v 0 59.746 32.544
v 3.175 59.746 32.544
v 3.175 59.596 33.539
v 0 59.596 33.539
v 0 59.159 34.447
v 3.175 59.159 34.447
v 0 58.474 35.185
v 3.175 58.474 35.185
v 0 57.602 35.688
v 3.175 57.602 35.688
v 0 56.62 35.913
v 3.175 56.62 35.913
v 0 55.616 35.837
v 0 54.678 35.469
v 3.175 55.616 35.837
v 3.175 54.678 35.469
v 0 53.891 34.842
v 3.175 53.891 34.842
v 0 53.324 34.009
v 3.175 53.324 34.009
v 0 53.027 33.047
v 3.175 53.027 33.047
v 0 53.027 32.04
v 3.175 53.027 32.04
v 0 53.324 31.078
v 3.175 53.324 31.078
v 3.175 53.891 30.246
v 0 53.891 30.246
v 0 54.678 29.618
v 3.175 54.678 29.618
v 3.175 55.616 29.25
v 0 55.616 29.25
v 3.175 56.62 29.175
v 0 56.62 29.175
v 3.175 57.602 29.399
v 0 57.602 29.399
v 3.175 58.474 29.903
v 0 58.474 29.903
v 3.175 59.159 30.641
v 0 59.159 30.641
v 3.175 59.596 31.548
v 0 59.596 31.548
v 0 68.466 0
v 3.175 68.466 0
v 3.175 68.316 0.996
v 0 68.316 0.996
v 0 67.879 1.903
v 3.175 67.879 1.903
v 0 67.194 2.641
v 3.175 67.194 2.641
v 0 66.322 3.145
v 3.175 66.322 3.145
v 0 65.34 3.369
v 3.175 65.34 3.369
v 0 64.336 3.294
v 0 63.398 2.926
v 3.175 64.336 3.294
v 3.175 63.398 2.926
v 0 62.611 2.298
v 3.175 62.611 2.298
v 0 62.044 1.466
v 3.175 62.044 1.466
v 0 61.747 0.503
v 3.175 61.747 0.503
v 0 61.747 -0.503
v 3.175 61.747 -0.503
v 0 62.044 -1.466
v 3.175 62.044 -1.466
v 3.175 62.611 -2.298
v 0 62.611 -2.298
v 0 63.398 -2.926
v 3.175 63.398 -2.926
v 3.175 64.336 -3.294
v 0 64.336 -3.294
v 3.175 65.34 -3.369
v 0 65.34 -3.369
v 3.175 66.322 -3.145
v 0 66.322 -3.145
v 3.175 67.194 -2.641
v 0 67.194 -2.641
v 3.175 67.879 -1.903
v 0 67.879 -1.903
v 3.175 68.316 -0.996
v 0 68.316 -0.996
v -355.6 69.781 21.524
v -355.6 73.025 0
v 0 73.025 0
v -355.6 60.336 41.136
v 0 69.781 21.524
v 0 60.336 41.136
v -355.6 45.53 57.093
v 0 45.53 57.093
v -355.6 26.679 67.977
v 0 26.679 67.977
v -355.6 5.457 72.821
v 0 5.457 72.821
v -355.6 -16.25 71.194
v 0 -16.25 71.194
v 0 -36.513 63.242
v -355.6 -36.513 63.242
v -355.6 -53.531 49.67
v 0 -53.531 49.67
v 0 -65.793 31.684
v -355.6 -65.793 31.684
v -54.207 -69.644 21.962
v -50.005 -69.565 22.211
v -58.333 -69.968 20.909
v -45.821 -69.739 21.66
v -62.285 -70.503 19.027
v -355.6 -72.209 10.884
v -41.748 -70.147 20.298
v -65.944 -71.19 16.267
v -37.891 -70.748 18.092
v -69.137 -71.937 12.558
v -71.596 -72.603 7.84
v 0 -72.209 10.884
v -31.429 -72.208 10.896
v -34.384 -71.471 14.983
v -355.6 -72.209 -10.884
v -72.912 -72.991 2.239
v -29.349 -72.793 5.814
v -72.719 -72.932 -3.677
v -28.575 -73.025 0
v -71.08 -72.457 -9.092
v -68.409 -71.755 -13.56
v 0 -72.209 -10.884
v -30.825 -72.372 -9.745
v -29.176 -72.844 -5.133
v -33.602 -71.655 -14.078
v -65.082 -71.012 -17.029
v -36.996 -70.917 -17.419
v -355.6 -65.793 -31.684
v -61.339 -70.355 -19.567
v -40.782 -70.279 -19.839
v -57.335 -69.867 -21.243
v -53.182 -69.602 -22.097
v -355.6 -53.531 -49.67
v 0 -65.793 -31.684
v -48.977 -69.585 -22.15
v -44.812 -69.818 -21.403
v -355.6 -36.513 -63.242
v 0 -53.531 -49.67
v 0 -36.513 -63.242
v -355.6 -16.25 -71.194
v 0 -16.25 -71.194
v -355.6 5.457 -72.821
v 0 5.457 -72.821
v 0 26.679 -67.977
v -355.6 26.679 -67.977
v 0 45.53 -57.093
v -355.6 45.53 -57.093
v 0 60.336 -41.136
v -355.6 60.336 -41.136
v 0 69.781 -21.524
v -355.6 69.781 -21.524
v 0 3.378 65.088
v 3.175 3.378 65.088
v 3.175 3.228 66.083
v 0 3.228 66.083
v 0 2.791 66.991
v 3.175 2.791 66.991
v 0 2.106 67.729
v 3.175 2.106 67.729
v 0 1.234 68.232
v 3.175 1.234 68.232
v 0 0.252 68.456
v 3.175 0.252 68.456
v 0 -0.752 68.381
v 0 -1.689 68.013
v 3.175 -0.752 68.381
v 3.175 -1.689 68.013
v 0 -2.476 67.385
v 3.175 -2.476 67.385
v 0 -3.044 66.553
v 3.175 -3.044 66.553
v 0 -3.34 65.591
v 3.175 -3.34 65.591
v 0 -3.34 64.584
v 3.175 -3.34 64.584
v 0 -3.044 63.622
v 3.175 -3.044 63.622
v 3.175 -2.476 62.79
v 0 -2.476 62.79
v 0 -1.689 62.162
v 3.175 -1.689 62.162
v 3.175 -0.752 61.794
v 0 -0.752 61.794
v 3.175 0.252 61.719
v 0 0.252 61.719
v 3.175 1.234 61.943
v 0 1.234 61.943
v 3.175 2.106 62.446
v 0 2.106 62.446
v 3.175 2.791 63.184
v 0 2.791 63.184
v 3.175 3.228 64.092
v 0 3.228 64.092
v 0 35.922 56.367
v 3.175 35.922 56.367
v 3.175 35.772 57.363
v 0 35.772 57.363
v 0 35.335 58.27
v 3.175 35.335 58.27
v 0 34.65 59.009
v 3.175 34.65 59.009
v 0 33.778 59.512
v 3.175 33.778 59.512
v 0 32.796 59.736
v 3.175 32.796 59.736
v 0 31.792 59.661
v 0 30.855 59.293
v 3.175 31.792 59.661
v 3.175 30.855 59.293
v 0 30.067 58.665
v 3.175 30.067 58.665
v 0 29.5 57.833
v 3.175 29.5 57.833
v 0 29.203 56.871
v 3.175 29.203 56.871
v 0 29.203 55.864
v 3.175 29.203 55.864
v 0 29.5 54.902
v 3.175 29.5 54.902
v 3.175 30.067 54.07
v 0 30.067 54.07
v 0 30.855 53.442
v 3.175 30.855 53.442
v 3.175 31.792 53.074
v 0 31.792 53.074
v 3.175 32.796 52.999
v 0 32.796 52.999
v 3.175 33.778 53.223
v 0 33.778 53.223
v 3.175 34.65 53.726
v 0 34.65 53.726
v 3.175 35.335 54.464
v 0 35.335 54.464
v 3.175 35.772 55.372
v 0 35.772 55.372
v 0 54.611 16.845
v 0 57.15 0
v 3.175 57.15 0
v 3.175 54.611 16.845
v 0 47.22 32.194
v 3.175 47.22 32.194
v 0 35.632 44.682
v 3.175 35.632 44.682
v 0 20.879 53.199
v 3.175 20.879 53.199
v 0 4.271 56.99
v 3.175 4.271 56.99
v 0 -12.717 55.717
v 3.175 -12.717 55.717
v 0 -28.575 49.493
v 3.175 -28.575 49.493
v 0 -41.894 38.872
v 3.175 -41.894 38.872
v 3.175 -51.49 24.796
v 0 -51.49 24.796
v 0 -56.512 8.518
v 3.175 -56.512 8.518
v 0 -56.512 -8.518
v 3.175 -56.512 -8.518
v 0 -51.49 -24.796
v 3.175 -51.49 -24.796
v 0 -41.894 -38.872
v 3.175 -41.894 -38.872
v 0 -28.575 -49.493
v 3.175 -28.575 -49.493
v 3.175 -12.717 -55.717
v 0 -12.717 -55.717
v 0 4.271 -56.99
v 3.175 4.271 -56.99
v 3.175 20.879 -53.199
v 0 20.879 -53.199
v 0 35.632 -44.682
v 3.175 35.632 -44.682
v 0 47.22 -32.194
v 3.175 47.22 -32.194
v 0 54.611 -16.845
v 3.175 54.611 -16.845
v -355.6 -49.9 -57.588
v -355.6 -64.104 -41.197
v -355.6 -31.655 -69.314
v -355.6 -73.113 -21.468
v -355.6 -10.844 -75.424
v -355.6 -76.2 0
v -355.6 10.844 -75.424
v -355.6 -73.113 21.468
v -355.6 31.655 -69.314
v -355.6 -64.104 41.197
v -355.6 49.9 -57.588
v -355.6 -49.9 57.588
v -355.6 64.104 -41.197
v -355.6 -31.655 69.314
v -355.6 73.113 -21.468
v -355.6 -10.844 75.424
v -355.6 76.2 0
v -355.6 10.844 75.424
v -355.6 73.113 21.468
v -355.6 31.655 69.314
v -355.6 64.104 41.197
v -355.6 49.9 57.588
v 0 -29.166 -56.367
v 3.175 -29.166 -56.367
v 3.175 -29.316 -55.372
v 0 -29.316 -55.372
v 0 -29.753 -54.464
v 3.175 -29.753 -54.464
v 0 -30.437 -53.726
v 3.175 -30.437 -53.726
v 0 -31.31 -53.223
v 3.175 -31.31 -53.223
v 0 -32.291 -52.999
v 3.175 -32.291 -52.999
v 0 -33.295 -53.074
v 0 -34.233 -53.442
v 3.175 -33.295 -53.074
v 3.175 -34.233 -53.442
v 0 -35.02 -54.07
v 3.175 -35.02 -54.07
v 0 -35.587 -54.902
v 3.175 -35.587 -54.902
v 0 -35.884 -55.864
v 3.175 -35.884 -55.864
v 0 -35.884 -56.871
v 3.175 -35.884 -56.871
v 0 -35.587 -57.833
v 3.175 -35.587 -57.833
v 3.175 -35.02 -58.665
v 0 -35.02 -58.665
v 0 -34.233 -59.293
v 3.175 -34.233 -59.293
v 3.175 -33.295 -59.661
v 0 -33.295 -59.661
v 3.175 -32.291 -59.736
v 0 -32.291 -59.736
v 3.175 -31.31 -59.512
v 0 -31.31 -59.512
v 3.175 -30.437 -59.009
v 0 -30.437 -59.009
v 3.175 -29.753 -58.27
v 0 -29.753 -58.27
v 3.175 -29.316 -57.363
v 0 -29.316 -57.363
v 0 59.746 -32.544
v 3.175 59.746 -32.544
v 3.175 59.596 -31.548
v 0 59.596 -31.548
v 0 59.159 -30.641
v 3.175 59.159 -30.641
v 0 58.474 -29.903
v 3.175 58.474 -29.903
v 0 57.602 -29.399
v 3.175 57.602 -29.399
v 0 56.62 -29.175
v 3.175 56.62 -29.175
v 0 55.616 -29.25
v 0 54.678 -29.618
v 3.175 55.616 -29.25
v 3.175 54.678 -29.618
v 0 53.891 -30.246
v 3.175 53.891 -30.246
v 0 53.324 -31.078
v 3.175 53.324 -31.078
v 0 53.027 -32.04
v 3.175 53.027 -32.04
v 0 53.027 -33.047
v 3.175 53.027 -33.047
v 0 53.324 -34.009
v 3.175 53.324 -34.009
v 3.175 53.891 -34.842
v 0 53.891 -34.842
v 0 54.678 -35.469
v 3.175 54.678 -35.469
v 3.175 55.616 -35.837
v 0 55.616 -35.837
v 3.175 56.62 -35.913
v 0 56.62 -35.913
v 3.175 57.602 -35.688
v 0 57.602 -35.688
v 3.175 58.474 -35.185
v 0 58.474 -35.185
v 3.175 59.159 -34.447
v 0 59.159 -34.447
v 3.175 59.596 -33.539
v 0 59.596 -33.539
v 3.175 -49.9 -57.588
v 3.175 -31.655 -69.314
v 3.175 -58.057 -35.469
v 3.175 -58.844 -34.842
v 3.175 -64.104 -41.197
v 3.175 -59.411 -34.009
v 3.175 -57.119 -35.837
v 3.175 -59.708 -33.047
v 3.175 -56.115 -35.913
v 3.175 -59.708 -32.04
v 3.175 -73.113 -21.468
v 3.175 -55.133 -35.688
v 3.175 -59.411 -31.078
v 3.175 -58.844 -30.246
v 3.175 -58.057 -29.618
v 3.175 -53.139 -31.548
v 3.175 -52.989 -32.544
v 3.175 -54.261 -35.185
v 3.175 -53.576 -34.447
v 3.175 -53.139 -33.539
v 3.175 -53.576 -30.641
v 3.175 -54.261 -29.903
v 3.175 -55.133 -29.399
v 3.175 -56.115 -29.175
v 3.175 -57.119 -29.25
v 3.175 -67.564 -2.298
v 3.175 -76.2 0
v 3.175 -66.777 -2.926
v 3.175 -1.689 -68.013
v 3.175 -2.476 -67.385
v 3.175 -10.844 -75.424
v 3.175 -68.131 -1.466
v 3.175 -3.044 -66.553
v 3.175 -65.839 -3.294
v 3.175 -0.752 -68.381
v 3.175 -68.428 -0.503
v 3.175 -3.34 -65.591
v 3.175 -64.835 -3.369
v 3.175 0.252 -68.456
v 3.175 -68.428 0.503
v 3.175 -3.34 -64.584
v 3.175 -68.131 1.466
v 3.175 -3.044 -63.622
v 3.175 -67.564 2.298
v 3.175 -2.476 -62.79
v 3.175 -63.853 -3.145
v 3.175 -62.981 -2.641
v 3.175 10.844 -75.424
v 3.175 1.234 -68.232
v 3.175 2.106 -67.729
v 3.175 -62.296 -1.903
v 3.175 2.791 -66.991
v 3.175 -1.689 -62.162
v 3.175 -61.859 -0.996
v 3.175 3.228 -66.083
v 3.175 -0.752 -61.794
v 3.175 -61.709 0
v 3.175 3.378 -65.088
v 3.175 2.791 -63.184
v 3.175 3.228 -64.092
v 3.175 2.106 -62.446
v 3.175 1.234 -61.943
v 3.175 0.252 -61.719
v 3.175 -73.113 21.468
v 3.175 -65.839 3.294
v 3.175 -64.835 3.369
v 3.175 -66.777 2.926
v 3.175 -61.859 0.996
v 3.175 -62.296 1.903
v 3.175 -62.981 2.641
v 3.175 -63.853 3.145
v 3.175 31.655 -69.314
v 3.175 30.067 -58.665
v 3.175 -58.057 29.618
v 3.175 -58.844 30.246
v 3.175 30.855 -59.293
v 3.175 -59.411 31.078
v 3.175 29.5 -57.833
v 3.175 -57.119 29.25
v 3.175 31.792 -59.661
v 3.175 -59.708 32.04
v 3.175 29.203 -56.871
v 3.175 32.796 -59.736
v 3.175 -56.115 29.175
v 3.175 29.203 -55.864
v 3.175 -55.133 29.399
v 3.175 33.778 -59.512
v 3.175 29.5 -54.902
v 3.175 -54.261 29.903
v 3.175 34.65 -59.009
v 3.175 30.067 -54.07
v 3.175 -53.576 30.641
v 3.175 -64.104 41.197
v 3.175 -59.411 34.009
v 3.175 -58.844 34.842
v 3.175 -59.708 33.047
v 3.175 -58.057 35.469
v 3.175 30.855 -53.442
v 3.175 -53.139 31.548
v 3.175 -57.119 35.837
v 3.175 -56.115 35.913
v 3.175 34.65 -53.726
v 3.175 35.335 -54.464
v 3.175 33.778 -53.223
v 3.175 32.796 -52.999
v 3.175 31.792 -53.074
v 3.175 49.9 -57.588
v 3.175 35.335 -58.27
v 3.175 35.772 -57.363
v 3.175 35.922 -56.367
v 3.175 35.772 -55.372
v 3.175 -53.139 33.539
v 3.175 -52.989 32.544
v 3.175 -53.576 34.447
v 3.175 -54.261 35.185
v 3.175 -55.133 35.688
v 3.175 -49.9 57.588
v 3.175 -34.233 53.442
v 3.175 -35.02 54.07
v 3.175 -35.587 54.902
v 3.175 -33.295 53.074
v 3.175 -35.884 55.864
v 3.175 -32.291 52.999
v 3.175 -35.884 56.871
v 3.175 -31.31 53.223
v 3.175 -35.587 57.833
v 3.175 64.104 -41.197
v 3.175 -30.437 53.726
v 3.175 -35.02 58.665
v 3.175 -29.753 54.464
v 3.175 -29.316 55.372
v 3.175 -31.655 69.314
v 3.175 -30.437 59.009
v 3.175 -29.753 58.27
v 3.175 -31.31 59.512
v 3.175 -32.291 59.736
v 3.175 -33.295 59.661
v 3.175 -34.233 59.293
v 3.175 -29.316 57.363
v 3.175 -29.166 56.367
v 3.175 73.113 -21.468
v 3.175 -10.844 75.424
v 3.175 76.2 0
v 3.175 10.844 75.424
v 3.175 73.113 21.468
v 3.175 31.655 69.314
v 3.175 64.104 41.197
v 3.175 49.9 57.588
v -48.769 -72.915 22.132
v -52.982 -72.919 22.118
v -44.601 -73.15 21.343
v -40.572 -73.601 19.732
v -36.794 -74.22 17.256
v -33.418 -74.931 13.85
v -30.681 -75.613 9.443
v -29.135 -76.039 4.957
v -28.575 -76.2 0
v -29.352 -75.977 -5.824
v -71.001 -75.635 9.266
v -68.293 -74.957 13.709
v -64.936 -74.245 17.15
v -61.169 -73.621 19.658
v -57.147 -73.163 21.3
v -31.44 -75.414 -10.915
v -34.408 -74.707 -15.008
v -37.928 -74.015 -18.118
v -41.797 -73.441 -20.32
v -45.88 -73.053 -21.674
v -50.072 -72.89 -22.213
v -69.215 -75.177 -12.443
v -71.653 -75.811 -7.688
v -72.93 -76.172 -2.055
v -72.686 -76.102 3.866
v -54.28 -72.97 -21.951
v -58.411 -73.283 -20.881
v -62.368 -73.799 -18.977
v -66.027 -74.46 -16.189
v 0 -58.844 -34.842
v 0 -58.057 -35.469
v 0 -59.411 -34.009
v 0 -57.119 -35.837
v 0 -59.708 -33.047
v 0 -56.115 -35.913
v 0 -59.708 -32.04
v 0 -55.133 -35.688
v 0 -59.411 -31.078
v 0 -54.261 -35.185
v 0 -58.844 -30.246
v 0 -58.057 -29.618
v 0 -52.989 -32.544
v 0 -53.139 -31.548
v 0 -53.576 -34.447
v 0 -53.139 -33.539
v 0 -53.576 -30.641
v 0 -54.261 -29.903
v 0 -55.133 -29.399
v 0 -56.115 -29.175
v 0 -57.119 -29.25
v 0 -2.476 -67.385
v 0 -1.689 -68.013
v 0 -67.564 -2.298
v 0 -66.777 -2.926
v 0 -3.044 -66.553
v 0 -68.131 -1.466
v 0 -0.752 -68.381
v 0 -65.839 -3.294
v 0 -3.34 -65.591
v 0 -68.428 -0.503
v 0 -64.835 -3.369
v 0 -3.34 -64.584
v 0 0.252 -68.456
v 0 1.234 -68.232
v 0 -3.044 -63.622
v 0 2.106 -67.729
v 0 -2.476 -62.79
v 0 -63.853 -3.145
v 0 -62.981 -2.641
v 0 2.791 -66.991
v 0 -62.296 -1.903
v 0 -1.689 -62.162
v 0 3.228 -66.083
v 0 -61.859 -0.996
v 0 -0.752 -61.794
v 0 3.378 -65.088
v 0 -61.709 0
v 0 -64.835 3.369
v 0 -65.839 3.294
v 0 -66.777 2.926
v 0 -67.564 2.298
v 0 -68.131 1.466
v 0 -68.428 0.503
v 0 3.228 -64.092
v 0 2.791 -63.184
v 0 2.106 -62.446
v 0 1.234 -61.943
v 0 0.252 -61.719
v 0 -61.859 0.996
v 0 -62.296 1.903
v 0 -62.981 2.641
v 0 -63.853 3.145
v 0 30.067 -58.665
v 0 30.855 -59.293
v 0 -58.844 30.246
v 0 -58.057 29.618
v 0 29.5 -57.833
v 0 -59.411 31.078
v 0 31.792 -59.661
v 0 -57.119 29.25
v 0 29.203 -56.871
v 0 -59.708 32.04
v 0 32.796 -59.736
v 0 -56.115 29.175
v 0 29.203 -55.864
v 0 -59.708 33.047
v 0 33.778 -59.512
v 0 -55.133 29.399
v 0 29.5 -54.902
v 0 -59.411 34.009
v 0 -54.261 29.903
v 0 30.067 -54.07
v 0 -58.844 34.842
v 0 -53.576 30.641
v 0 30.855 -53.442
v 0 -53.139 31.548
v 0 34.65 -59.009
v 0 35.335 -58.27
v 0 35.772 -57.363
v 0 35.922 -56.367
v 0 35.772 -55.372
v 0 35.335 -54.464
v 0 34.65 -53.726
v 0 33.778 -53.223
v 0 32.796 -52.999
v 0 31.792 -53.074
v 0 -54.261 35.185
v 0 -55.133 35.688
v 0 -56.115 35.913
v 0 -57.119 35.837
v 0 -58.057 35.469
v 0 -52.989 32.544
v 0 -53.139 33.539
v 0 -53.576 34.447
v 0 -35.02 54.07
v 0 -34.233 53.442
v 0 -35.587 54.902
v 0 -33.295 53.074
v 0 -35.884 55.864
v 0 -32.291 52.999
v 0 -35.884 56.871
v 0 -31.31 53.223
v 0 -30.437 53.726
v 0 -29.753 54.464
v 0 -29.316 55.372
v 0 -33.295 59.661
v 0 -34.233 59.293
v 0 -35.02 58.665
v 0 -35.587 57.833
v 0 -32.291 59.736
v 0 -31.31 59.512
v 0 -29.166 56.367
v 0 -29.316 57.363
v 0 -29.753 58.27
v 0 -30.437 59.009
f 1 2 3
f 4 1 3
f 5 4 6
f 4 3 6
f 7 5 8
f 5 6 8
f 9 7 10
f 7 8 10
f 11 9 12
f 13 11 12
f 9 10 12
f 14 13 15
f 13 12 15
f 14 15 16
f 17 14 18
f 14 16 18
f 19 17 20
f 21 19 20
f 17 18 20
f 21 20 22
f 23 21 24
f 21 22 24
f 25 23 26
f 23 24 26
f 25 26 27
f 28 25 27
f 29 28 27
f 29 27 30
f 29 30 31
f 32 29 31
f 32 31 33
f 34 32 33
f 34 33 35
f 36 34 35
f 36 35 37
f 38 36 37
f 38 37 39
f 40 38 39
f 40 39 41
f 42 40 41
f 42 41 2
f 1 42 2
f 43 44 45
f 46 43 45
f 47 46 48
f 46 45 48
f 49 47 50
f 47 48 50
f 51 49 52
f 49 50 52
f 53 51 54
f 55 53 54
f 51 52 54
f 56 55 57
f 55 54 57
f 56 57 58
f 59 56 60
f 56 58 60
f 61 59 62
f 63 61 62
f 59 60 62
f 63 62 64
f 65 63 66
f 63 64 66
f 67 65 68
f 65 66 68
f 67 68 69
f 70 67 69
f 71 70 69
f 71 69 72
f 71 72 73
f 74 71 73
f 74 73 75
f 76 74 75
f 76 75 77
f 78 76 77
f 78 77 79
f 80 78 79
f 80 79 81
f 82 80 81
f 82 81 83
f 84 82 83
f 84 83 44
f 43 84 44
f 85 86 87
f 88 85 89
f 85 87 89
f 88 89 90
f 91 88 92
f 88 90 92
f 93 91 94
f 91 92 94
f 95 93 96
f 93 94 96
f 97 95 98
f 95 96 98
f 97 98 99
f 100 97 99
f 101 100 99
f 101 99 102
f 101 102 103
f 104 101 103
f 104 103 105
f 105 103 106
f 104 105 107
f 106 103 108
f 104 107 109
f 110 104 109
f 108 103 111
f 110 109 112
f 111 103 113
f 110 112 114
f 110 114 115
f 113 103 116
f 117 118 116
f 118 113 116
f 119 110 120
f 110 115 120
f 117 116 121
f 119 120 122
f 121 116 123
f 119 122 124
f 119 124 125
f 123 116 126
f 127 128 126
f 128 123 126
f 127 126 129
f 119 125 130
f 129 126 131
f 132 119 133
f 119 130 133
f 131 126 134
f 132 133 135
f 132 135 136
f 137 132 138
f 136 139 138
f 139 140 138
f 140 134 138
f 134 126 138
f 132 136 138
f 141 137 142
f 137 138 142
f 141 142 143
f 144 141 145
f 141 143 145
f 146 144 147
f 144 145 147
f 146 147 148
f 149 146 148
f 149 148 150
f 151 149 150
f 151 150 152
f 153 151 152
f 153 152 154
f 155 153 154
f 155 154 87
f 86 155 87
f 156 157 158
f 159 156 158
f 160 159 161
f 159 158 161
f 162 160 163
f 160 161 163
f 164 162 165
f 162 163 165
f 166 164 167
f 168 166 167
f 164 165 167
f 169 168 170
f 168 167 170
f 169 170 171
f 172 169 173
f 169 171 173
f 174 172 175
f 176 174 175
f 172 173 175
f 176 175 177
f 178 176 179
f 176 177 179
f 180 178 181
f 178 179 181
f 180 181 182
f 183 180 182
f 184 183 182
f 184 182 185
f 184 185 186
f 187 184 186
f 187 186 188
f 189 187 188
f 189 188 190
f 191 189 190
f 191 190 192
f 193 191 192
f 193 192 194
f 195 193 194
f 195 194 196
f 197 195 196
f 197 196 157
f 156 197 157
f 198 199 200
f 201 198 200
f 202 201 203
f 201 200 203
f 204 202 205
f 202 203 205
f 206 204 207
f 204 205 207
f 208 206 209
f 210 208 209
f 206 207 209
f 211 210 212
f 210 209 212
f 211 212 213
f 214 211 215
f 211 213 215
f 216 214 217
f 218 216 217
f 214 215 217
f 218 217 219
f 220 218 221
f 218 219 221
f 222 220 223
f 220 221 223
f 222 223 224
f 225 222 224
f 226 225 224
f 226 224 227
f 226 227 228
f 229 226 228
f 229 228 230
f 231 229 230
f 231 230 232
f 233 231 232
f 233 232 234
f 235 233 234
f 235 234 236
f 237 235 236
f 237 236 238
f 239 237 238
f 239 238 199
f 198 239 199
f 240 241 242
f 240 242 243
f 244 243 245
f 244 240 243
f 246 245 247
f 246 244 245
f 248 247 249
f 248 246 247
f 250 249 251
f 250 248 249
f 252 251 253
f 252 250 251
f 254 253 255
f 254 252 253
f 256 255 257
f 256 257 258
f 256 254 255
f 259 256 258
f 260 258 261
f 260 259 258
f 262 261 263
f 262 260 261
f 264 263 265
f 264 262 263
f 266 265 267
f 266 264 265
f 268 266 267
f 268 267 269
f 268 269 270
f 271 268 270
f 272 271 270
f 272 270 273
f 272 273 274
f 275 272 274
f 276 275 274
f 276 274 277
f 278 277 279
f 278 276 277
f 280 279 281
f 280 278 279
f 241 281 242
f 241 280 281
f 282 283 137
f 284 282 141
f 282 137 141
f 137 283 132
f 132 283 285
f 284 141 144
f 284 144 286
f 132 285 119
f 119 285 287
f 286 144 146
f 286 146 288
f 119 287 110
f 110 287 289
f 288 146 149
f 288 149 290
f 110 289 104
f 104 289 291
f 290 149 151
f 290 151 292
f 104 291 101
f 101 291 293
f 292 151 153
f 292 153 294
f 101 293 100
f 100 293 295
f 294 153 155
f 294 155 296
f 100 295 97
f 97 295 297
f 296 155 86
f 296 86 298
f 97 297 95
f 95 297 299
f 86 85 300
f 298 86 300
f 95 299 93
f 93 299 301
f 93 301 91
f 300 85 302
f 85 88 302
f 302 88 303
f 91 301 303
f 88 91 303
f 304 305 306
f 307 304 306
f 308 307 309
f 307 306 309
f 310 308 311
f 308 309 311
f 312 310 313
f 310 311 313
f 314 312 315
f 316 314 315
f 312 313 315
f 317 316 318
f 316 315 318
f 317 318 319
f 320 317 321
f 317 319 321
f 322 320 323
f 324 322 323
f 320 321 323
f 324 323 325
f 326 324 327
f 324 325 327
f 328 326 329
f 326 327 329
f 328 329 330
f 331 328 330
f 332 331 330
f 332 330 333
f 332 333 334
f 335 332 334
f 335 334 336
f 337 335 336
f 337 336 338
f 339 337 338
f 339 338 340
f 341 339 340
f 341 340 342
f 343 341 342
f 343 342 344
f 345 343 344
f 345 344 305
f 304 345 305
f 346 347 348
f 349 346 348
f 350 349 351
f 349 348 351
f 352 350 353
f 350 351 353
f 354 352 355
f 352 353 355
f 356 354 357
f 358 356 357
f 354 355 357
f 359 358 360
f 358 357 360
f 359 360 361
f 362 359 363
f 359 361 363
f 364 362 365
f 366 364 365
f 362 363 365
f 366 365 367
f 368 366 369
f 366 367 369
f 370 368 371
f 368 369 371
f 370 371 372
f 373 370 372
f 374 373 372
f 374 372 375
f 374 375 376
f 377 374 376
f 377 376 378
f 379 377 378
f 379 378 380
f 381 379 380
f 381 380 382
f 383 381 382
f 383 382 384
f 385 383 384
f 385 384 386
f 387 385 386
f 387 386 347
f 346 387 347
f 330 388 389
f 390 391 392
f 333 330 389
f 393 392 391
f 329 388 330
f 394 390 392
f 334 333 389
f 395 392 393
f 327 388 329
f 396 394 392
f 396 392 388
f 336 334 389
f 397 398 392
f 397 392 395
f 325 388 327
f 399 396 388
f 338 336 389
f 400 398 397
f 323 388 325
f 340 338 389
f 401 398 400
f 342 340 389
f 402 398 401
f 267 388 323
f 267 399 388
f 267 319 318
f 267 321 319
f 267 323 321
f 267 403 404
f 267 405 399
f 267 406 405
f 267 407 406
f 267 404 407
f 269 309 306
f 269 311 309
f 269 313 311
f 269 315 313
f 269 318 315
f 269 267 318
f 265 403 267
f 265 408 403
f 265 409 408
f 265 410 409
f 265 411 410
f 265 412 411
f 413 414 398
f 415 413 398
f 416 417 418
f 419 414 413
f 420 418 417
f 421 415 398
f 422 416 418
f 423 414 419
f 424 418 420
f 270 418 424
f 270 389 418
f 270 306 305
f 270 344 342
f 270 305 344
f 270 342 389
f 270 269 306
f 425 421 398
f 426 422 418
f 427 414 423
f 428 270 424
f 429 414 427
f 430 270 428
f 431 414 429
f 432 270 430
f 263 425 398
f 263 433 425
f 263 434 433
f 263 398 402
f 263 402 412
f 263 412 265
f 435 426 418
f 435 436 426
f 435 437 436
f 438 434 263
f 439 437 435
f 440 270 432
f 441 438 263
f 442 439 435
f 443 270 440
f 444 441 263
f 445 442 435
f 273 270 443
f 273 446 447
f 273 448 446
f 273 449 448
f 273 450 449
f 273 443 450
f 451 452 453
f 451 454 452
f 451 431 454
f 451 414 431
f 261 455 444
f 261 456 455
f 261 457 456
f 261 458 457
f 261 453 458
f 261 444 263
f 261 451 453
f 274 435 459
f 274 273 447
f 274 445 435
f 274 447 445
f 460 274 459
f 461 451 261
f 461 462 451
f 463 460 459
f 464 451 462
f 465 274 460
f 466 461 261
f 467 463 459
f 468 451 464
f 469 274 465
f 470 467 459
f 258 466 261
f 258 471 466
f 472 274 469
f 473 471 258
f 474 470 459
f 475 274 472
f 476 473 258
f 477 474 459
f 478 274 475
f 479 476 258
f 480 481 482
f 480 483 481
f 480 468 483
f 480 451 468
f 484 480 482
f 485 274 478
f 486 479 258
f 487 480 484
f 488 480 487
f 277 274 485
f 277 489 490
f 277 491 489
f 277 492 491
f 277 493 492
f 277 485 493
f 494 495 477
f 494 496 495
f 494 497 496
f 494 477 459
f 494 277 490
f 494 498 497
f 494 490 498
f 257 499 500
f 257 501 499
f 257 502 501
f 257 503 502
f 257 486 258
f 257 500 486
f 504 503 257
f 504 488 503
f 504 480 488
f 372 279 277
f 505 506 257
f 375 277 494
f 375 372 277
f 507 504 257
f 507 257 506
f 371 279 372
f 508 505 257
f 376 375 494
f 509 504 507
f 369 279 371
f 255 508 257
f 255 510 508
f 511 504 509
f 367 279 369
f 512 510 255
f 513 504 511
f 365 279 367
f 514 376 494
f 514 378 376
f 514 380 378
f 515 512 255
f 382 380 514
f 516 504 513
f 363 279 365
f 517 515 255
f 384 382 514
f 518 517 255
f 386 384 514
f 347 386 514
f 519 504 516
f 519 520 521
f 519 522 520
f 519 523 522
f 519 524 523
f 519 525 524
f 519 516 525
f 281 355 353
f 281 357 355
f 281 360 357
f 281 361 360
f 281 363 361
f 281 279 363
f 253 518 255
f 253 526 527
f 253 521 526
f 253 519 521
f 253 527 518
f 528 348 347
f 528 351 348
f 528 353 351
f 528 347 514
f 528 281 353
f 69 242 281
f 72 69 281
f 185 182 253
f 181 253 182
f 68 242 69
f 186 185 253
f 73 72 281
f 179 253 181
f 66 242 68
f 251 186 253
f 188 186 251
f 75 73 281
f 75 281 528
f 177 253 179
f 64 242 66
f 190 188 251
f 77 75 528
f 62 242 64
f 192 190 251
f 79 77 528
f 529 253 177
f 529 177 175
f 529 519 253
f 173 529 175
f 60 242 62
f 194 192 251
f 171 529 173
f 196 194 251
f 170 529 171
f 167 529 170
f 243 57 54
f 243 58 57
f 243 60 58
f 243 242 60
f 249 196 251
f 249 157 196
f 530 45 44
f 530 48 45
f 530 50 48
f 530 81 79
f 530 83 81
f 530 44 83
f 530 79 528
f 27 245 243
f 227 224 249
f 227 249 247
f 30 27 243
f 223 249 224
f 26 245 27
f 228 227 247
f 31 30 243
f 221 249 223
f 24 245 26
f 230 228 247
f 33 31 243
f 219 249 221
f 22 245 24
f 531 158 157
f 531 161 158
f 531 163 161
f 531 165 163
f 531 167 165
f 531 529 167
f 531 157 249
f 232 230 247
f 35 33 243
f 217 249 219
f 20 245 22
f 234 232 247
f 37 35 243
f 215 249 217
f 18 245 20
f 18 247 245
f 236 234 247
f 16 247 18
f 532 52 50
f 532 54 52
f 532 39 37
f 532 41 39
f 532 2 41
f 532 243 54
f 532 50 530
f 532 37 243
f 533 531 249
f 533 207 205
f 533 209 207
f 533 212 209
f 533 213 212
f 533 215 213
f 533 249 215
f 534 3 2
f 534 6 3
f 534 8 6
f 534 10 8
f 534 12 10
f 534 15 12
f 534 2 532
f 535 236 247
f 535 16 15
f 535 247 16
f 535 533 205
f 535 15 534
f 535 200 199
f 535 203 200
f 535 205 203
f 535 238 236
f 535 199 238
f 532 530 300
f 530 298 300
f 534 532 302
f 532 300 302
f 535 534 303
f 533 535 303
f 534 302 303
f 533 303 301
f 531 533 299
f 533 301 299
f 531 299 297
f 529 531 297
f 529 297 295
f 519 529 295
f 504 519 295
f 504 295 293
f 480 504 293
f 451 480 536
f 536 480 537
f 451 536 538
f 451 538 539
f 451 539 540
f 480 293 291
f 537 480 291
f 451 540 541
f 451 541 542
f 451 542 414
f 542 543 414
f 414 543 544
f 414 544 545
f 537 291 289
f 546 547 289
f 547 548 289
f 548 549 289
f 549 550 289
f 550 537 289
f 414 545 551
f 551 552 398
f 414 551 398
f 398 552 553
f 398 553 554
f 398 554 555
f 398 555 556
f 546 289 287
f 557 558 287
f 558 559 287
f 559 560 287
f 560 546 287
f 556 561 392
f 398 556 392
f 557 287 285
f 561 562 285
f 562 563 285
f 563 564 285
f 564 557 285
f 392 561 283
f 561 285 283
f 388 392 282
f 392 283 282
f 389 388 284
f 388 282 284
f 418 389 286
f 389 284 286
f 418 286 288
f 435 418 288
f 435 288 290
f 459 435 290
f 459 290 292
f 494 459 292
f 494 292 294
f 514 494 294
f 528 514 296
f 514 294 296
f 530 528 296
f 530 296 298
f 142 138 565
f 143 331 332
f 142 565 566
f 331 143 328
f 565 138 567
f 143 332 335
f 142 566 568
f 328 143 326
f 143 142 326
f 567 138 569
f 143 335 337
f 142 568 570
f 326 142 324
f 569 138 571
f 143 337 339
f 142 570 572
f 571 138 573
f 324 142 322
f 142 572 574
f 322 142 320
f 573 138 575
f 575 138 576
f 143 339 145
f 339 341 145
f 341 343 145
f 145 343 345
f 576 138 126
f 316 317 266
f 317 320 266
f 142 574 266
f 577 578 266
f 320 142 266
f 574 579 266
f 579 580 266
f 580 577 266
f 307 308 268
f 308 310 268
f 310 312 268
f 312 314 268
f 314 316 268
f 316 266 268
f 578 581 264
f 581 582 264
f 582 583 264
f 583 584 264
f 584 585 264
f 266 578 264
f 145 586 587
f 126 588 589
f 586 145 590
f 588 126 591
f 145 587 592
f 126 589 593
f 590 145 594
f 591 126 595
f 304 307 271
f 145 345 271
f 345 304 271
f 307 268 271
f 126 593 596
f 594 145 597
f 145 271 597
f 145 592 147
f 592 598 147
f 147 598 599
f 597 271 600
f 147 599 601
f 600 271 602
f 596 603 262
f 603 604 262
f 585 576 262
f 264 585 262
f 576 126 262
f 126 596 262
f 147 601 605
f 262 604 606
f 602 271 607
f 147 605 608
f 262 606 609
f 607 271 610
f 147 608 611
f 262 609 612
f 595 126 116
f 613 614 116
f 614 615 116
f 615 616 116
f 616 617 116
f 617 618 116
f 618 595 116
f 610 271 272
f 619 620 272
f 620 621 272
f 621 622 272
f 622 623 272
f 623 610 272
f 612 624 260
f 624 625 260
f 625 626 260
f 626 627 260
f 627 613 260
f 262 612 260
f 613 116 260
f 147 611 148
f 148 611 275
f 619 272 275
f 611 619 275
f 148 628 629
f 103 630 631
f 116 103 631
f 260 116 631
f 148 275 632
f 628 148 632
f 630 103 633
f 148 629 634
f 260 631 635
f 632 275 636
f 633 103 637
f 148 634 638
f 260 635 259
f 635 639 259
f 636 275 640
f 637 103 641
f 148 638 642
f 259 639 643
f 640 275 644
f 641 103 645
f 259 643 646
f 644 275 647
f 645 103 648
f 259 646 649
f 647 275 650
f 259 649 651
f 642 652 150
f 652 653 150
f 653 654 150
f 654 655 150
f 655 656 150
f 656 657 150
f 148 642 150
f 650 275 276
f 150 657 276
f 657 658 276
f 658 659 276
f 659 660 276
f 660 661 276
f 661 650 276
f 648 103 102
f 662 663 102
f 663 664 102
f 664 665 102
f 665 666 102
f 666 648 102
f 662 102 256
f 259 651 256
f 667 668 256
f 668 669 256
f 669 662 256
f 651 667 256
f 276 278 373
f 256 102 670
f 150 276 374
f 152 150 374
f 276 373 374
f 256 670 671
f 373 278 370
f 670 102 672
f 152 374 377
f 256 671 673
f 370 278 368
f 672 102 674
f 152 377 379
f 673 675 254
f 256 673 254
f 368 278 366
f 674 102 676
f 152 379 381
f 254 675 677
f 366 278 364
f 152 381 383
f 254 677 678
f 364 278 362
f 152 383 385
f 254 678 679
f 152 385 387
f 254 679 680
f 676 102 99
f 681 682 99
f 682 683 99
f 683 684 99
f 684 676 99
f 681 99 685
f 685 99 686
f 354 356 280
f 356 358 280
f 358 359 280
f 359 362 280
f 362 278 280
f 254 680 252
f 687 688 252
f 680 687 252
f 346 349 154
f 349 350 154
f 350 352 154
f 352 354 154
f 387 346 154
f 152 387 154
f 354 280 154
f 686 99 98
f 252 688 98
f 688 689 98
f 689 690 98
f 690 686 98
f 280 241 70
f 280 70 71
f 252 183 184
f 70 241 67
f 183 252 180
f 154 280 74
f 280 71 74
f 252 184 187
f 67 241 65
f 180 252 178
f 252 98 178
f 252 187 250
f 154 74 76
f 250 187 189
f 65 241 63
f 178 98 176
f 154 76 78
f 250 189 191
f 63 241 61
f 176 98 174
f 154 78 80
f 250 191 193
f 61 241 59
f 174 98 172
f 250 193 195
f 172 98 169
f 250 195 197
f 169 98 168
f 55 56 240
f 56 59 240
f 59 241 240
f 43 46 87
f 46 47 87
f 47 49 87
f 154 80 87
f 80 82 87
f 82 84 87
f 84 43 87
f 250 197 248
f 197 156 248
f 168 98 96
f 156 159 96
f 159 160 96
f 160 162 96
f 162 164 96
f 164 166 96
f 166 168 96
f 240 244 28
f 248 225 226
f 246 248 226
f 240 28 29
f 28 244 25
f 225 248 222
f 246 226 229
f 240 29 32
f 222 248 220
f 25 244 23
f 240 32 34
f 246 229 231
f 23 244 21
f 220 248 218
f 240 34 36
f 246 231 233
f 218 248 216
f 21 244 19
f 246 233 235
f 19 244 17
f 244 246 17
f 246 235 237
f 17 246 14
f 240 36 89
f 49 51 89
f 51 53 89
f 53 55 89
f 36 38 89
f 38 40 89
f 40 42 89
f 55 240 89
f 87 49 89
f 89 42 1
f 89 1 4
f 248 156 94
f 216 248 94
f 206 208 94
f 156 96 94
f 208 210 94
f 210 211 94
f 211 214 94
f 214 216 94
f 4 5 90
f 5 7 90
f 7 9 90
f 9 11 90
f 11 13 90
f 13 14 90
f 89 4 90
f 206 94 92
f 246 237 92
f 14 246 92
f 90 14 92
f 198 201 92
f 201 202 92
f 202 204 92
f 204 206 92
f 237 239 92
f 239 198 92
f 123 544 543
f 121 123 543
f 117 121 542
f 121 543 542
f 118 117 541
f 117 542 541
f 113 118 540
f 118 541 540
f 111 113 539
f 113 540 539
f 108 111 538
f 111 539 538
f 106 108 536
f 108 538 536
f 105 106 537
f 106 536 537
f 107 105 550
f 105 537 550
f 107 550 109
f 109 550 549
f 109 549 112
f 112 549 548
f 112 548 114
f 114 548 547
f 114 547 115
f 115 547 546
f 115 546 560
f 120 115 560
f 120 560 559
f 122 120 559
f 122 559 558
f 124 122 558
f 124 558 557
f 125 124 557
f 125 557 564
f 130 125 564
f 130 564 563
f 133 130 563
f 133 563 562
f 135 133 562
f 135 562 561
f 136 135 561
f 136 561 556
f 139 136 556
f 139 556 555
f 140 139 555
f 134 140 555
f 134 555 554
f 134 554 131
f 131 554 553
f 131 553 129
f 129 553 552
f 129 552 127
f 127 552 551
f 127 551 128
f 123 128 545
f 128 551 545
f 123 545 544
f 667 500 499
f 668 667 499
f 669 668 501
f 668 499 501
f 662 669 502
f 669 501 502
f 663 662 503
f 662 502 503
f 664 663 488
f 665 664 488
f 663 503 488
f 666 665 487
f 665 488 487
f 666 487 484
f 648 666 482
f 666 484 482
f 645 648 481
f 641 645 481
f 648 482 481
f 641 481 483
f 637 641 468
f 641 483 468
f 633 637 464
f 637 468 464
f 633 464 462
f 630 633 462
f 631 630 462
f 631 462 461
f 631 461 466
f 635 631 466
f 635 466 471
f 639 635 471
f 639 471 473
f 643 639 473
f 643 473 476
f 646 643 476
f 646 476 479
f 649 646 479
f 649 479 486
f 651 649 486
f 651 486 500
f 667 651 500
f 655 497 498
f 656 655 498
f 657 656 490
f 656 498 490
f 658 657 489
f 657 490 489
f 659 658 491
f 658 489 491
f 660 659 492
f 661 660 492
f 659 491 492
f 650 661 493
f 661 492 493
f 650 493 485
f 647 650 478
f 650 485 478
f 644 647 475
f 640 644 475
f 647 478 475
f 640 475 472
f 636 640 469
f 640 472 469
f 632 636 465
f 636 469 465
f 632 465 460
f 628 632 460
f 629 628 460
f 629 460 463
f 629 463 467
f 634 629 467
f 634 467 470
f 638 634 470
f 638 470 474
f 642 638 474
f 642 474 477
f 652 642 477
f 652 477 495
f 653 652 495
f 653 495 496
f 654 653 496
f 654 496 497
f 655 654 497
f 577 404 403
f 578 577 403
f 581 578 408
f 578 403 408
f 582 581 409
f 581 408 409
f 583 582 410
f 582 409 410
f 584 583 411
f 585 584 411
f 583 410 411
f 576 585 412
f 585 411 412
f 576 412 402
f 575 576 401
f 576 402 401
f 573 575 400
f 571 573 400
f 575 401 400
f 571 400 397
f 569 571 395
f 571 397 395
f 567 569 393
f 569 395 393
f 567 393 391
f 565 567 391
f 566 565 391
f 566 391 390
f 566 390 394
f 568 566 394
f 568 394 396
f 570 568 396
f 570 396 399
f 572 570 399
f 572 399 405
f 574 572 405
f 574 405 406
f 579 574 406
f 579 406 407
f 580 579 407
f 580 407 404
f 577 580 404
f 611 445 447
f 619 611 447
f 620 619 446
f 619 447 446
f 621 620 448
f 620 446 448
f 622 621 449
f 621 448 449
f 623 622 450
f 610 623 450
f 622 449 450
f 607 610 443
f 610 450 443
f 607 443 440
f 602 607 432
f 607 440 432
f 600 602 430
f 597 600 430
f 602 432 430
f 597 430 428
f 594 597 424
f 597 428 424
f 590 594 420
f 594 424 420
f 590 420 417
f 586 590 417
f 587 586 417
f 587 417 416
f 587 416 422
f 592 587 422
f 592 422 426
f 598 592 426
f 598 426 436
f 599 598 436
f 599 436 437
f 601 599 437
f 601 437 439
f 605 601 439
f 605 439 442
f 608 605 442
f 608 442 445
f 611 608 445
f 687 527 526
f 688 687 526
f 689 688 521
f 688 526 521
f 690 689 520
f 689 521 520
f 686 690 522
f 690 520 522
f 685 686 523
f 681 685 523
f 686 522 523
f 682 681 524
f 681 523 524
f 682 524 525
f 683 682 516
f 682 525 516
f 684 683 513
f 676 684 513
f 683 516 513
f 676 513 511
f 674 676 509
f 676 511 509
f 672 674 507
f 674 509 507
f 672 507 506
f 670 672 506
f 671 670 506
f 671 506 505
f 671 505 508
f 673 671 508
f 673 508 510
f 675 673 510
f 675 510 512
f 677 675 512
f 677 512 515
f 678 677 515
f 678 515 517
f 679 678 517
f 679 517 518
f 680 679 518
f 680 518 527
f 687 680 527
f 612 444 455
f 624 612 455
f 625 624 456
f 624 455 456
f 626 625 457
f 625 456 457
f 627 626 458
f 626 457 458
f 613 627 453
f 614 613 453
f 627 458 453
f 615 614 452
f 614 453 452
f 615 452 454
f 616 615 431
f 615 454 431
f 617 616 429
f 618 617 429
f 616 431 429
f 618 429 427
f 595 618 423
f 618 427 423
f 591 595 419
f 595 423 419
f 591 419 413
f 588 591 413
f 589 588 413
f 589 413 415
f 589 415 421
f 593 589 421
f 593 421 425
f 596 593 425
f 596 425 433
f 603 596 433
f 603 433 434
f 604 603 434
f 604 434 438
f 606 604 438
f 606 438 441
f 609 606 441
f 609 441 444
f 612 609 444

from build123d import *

# Parameters (mm, degrees)
F0_R     = 76.2
F0_R_2   = 73.025
F1_DEPTH = 355.6
F2_R     = 76.2
F2_R_2   = 57.15
F3_DEPTH = 3.175
F4_R     = 3.3782
F5_DEPTH = 358.776
F7_R     = 22.225
F8_DEPTH = 7.6392352968


with BuildPart() as f1:
    # F0 (on Right) → F1 (new body)
    with BuildSketch(Plane.YZ):
        Circle(F0_R)
        Circle(F0_R_2, mode=Mode.SUBTRACT)
    extrude(amount=-F1_DEPTH)

    # F2 (on Right) → F3 (join)
    with BuildSketch(Plane.YZ):
        Circle(F2_R)
        Circle(F2_R_2, mode=Mode.SUBTRACT)
    extrude(amount=F3_DEPTH)

    # F4 (on face) → F5 (cut, through all)
    with BuildSketch(Plane.YZ.offset(3.175)):
        with Locations((0, 65.0875)):
            Circle(F4_R)
        with Locations((32.54375, 56.3674284688)):
            Circle(F4_R)
        with Locations((56.3674284688, 32.54375)):
            Circle(F4_R)
        with Locations((65.0875, 0)):
            Circle(F4_R)
        with Locations((56.3674284688, -32.54375)):
            Circle(F4_R)
        with Locations((32.54375, -56.3674284688)):
            Circle(F4_R)
        with Locations((0, -65.0875)):
            Circle(F4_R)
        with Locations((-32.54375, -56.3674284688)):
            Circle(F4_R)
        with Locations((-56.3674284688, -32.54375)):
            Circle(F4_R)
        with Locations((-65.0875, 0)):
            Circle(F4_R)
        with Locations((-56.3674284688, 32.54375)):
            Circle(F4_R)
        with Locations((-32.54375, 56.3674284688)):
            Circle(F4_R)
    extrude(amount=-F5_DEPTH, mode=Mode.SUBTRACT)

    # F7 (on offset) → F8 (cut, up to face)
    with BuildSketch(Plane.XZ.offset(76.2)):
        with Locations((-50.8, 0)):
            Circle(F7_R)
    extrude(amount=-F8_DEPTH, mode=Mode.SUBTRACT)


solid = f1.part
